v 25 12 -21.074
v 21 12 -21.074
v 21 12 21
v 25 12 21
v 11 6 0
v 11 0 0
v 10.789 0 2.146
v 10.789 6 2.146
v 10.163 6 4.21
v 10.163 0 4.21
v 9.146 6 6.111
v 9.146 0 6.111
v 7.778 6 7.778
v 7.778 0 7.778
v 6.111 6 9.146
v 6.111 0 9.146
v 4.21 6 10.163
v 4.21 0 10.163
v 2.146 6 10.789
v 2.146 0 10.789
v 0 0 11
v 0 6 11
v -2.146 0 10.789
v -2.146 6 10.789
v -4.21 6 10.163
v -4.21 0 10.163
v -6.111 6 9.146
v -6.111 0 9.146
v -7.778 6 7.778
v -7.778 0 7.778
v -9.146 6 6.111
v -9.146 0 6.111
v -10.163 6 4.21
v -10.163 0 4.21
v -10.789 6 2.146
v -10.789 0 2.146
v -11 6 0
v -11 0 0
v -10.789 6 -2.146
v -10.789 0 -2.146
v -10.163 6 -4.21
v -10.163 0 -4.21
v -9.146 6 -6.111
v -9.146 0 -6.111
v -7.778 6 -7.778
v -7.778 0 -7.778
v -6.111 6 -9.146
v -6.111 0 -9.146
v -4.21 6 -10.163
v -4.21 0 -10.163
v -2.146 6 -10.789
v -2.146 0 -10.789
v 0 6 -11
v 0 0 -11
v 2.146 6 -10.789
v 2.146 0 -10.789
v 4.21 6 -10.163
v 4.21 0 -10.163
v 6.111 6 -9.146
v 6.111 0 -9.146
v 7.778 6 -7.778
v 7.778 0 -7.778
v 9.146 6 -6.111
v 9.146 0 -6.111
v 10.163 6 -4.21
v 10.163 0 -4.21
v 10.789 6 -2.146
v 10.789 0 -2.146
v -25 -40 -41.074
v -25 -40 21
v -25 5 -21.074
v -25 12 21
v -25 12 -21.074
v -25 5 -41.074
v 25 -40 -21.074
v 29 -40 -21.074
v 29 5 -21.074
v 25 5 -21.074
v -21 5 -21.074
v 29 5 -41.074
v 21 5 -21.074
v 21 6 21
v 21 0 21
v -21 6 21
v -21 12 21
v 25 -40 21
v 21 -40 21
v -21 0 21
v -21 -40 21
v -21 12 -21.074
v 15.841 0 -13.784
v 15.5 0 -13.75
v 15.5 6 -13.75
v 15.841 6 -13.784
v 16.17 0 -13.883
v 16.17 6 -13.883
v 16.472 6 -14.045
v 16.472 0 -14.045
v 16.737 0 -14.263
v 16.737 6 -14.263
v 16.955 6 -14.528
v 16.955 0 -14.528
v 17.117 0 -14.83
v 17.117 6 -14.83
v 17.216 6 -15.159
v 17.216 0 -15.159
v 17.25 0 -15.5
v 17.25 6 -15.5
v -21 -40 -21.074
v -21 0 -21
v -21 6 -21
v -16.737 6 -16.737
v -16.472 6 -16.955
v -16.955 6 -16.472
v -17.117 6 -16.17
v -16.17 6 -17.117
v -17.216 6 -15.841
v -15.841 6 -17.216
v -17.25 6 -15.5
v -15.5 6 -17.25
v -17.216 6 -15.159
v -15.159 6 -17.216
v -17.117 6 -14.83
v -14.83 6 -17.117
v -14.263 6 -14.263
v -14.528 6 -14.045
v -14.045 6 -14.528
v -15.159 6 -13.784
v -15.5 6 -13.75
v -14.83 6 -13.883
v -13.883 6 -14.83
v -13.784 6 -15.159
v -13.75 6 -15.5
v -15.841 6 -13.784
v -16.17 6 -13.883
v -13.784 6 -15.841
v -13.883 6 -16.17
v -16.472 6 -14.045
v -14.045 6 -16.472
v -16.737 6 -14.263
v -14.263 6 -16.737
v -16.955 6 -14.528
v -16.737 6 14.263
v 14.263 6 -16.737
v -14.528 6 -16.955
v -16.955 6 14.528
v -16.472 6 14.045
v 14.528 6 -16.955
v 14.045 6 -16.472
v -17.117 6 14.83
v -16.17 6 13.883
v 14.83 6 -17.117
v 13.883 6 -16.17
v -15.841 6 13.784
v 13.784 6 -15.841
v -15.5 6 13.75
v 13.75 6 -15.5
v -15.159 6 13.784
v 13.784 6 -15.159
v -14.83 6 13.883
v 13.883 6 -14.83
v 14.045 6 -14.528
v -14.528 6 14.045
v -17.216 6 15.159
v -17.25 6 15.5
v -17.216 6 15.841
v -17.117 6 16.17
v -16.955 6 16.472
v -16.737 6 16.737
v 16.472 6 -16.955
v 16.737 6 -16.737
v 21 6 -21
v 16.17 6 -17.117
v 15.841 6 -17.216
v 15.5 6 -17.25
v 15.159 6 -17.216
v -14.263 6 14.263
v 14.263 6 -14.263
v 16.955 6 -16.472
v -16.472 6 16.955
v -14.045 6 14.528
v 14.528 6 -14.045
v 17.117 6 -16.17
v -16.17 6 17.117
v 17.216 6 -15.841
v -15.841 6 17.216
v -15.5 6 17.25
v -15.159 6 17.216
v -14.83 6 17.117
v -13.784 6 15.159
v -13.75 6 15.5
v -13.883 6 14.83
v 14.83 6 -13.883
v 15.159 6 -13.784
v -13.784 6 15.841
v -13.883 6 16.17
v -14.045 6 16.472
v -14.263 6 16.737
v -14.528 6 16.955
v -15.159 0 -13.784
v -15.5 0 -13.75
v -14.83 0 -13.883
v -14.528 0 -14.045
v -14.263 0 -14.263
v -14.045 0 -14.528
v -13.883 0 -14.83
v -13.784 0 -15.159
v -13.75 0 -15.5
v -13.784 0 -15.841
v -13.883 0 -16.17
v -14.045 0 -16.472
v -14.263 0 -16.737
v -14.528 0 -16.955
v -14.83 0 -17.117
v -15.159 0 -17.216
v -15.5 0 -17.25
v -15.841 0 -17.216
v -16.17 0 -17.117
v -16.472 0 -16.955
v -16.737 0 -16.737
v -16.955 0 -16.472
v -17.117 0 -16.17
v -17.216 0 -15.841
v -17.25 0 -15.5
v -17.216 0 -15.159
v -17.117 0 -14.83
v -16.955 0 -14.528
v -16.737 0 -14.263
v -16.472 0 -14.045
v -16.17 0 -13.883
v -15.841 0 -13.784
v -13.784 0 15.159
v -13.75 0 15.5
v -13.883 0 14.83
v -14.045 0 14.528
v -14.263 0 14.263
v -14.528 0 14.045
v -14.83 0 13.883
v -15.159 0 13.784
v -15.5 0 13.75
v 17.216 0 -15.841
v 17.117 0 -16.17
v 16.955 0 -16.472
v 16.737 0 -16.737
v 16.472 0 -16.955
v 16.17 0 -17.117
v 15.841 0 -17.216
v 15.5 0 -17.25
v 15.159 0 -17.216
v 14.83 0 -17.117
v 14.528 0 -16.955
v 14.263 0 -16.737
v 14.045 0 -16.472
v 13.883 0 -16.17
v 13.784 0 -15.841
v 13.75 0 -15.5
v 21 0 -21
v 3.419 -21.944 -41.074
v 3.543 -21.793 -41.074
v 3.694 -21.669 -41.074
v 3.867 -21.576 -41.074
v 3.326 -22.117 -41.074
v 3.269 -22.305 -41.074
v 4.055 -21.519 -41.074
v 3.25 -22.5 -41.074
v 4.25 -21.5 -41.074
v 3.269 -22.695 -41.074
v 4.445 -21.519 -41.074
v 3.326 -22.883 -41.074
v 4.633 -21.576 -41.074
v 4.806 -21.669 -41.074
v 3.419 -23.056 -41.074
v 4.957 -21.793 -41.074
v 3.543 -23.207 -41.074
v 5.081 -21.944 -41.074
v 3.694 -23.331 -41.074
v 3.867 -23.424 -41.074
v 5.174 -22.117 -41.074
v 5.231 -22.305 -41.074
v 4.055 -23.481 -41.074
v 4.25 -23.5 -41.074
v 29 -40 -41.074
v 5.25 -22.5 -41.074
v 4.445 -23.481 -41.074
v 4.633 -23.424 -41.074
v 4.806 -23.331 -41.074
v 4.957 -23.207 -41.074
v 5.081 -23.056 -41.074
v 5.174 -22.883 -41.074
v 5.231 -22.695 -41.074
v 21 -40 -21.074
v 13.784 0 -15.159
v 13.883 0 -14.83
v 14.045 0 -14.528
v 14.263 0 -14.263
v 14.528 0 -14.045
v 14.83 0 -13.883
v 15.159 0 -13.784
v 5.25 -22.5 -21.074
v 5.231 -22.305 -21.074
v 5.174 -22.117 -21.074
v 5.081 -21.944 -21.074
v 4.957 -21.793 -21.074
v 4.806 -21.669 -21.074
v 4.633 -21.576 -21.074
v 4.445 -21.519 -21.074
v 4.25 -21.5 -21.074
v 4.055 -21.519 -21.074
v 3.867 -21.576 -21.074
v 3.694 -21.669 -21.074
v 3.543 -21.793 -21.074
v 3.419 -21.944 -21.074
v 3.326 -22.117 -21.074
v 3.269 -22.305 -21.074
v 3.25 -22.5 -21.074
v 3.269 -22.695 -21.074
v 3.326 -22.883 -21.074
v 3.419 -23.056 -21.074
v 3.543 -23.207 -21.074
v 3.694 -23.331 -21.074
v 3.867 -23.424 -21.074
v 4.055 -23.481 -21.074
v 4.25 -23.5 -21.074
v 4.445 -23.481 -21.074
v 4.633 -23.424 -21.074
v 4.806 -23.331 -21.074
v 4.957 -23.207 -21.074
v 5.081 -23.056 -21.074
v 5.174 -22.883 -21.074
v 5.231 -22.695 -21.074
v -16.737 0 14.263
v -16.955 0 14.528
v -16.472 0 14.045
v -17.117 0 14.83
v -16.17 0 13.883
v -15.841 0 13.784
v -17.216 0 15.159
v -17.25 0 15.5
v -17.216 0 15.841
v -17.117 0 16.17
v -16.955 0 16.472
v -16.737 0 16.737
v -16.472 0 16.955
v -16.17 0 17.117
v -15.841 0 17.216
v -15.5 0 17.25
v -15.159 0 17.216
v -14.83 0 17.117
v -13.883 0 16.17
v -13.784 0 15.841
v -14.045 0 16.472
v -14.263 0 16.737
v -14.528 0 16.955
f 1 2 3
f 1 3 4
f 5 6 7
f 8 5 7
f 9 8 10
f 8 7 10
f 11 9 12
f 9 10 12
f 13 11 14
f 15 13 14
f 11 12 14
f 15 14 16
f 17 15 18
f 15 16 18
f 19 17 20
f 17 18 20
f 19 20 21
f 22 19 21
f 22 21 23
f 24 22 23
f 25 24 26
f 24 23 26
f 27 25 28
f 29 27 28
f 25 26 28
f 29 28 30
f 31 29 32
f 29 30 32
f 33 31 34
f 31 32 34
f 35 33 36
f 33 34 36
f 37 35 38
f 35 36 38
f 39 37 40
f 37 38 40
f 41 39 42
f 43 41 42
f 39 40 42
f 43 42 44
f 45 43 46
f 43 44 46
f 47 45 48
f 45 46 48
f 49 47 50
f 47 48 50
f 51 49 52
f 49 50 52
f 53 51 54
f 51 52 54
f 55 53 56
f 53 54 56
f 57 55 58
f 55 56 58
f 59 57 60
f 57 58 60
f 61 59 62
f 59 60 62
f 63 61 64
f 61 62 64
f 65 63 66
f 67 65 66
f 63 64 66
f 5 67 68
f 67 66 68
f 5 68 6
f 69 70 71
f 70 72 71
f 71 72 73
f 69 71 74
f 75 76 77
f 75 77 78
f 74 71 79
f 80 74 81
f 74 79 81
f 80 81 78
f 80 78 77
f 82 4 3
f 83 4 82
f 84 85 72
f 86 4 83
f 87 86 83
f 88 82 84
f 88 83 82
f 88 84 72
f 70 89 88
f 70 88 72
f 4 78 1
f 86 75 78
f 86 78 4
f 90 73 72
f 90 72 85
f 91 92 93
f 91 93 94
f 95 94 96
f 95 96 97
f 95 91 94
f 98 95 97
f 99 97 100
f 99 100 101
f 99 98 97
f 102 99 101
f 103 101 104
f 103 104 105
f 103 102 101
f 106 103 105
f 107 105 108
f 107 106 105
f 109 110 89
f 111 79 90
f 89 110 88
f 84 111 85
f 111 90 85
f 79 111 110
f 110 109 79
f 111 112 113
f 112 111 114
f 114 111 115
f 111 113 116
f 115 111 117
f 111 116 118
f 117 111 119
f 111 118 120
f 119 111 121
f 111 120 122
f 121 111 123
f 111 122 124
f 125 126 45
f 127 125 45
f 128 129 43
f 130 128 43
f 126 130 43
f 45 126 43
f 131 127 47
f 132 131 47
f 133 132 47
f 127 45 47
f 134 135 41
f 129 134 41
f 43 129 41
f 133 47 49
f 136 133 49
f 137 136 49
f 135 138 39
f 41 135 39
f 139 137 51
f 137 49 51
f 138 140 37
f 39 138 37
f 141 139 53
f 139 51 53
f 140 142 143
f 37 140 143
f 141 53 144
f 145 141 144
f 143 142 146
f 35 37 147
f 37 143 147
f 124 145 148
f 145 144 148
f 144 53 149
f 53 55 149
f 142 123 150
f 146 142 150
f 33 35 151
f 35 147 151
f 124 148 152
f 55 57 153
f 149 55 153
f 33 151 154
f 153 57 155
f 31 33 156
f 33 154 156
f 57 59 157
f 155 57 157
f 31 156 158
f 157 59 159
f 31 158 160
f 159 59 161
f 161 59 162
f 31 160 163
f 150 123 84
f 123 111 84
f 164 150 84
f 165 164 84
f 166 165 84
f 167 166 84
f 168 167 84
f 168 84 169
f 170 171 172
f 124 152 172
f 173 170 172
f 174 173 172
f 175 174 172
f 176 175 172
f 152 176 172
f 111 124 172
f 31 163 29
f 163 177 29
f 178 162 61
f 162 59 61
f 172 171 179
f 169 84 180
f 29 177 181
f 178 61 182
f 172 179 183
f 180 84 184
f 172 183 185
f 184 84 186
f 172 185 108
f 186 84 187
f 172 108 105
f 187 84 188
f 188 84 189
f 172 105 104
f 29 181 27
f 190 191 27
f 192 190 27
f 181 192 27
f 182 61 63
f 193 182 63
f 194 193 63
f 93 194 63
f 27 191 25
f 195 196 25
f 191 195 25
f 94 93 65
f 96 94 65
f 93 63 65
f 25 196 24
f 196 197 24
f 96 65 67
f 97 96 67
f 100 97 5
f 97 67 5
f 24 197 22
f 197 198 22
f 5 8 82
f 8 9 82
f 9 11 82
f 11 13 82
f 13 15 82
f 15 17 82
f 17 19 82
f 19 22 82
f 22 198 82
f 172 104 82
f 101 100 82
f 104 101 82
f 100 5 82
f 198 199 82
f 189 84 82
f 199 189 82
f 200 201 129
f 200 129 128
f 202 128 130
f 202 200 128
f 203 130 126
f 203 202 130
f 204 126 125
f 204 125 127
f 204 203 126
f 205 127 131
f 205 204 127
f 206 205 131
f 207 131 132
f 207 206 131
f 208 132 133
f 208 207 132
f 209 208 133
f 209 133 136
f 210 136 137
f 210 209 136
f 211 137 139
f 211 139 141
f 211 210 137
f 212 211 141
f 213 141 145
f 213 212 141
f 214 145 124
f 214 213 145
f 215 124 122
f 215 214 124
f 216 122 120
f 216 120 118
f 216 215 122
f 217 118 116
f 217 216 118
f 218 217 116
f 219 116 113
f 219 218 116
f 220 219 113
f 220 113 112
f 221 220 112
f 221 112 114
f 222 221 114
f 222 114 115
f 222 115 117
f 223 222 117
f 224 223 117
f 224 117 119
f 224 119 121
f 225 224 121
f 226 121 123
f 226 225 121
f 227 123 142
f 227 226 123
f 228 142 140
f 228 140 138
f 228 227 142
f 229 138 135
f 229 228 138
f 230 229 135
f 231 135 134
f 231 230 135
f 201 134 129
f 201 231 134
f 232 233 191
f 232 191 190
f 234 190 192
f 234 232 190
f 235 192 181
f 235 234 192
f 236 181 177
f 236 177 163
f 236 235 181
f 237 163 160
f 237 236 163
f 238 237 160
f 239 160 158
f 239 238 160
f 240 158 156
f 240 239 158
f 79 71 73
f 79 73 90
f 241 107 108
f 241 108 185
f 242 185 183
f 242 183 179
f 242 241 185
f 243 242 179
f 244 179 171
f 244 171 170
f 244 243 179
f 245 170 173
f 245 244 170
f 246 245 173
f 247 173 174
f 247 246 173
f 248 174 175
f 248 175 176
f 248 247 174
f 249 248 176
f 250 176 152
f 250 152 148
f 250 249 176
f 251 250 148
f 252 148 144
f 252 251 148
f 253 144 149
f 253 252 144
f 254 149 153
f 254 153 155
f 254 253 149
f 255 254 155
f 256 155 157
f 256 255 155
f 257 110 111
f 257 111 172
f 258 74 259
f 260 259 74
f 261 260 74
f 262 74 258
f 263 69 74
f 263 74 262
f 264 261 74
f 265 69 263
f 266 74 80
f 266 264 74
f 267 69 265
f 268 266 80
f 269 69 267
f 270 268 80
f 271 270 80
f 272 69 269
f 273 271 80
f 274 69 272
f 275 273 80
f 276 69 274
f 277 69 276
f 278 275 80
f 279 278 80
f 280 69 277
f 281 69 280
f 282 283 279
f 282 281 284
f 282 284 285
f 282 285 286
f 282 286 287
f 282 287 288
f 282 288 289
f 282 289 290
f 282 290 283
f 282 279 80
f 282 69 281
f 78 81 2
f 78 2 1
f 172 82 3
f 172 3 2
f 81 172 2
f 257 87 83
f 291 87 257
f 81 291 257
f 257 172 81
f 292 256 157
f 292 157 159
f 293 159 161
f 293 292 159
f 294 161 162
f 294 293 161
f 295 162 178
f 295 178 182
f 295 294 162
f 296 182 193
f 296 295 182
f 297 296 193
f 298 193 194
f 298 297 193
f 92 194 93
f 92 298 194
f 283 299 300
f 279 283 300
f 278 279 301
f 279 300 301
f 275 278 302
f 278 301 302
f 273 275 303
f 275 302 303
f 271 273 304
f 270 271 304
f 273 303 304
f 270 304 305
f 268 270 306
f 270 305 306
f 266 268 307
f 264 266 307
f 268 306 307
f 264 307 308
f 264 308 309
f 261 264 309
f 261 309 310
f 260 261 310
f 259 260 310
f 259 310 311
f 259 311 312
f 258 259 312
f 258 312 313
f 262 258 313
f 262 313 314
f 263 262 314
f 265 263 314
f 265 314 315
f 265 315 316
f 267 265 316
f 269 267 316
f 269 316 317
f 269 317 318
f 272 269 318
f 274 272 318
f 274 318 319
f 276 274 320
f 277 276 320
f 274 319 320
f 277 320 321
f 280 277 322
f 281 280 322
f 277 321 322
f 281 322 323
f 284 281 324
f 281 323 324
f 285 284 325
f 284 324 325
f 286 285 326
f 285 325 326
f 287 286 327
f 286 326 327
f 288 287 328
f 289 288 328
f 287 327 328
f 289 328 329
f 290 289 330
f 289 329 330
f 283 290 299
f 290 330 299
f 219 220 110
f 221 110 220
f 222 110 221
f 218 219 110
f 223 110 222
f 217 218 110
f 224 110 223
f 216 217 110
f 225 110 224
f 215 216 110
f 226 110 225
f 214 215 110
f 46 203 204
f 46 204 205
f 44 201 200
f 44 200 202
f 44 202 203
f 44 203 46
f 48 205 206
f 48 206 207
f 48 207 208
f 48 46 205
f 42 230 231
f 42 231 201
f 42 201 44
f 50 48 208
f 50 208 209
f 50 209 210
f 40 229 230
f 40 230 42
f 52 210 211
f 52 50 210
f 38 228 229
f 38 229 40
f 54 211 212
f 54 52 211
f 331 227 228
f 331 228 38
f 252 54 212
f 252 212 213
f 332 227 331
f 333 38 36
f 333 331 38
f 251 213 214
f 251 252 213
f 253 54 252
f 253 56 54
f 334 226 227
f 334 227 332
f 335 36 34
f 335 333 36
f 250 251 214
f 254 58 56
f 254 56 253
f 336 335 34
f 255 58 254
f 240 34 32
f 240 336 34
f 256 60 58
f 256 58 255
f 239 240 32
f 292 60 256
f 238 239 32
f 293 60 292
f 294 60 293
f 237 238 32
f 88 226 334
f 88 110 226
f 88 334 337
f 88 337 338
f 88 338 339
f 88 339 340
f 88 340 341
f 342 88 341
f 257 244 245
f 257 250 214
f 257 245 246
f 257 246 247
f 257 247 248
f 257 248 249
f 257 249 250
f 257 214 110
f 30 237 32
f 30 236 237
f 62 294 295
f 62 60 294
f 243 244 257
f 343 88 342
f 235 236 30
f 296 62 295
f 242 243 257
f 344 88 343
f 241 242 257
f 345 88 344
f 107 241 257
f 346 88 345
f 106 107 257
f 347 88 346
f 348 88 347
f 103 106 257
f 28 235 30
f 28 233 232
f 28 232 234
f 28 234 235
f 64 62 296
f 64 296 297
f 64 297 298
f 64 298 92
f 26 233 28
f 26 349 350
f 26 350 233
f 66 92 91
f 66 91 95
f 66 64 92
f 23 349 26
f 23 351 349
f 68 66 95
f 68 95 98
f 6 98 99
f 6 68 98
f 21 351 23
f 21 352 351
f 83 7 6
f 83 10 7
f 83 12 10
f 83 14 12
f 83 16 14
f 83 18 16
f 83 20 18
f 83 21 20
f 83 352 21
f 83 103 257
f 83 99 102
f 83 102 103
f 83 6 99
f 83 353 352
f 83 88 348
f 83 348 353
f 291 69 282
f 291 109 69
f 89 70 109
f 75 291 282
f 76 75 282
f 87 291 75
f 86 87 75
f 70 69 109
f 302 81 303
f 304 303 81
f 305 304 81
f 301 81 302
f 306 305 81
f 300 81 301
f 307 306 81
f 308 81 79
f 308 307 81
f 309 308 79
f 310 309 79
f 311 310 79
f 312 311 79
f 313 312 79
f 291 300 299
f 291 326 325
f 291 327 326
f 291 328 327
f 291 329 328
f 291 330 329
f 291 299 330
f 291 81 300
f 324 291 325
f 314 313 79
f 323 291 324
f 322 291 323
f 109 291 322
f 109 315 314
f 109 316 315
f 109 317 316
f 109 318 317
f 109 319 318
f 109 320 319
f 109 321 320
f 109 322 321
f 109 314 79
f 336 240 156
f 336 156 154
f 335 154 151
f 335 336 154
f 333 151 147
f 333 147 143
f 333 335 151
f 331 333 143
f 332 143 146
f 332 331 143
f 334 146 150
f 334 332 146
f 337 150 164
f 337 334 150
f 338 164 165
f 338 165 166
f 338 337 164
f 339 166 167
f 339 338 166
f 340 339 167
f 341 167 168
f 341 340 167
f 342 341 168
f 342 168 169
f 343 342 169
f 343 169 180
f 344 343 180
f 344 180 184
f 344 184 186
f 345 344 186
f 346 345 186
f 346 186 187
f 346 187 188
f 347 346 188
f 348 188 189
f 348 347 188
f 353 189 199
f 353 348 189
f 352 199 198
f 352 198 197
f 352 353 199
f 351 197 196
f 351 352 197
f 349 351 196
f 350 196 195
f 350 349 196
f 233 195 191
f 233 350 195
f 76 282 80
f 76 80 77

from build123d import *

# Parameters (mm, degrees)
F0_W     = 42
F0_H     = 42
F0_R     = 11
F1_DEPTH = 6
F0_W_2   = 4
F0_H_2   = 20
F2_DEPTH = 40
F3_DEPTH = 5
F4_DEPTH = 40
F6_R     = 1
F7_DEPTH = 25
F8_DEPTH = 12


with BuildPart() as f1:
    # F0 (on Front) → F1 (new body)
    with BuildSketch(Plane.XZ):
        Rectangle(F0_W, F0_H)
        with BuildLine():
            ThreePointArc((-15.5, 13.75), (-16.7374368671, 16.7374368671), (-13.75, 15.5))
            Line((-13.75, 15.5), (15.5, 15.5))
            Line((15.5, 15.5), (15.5, -13.75))
            ThreePointArc((15.5, -13.75), (16.7374368671, -14.2625631329), (17.25, -15.5))
            ThreePointArc((17.25, -15.5), (15.5, -17.25), (13.75, -15.5))
            Line((13.75, -15.5), (-13.75, -15.5))
            ThreePointArc((-13.75, -15.5), (-16.7374368671, -16.7374368671), (-15.5, -13.75))
            Line((-15.5, -13.75), (-15.5, 13.75))
        make_face(mode=Mode.SUBTRACT)
        with BuildLine():
            Line((15.5, 15.5), (-13.75, 15.5))
            ThreePointArc((-13.75, 15.5), (-14.2625631329, 14.2625631329), (-15.5, 13.75))
            Line((-15.5, 13.75), (-15.5, -13.75))
            ThreePointArc((-15.5, -13.75), (-14.2625631329, -14.2625631329), (-13.75, -15.5))
            Line((-13.75, -15.5), (13.75, -15.5))
            ThreePointArc((13.75, -15.5), (14.2625631329, -14.2625631329), (15.5, -13.75))
            Line((15.5, -13.75), (15.5, 15.5))
        make_face()
        Circle(F0_R, mode=Mode.SUBTRACT)
    extrude(amount=-F1_DEPTH)



with BuildPart() as f2:
    # F0 (on Front) → F2 (new body)
    with BuildSketch(Plane.XZ):
        with Locations((-23, -31.0743206739)):
            Rectangle(F0_W_2, F0_H_2)
        with Locations((0, -31.0743206739)):
            Rectangle(F0_W, F0_H_2)
        with Locations((23, -31.0743206739)):
            Rectangle(F0_W_2, F0_H_2)
        with Locations((27, -31.0743206739)):
            Rectangle(F0_W_2, F0_H_2)
    extrude(amount=F2_DEPTH)

    # F3 (add): a face of the model
    f3_faces = [f2.faces().sort_by_distance(p)[0] for p in [
        (2, 0, -31.0743206739),
    ]]
    extrude(f3_faces, amount=F3_DEPTH)


with BuildPart() as f1_1:
    add(f1.part)

    add(f2.part)  # F4 merges F2
    # F0 (on Front) → F4 (join)
    with BuildSketch(Plane.XZ):
        Polygon((-21, -21), (-21, 21), (-25, 21), (-25, -21.0743206739), (-21, -21.0743206739), align=None)
        with Locations((-23, -31.0743206739)):
            Rectangle(F0_W_2, F0_H_2)
        Polygon((25, 21), (21, 21), (21, -21), (21, -21.0743206739), (25, -21.0743206739), align=None)
        with Locations((23, -31.0743206739)):
            Rectangle(F0_W_2, F0_H_2)
    extrude(amount=F4_DEPTH)

    # F5: union 

    # F6 (on face) → F7 (cut)
    with BuildSketch(Plane.XY.offset(-21.0743206739)):
        with Locations((4.25, -22.5)):
            Circle(F6_R)
    extrude(amount=-F7_DEPTH, mode=Mode.SUBTRACT)

    # F8 (add): faces of the model
    f8_faces = [f1_1.faces().sort_by_distance(p)[0] for p in [
        (23, 0, -0.037160337),
        (-23, 0, -0.037160337),
    ]]
    extrude(f8_faces, amount=F8_DEPTH)


solid = f1_1.part
